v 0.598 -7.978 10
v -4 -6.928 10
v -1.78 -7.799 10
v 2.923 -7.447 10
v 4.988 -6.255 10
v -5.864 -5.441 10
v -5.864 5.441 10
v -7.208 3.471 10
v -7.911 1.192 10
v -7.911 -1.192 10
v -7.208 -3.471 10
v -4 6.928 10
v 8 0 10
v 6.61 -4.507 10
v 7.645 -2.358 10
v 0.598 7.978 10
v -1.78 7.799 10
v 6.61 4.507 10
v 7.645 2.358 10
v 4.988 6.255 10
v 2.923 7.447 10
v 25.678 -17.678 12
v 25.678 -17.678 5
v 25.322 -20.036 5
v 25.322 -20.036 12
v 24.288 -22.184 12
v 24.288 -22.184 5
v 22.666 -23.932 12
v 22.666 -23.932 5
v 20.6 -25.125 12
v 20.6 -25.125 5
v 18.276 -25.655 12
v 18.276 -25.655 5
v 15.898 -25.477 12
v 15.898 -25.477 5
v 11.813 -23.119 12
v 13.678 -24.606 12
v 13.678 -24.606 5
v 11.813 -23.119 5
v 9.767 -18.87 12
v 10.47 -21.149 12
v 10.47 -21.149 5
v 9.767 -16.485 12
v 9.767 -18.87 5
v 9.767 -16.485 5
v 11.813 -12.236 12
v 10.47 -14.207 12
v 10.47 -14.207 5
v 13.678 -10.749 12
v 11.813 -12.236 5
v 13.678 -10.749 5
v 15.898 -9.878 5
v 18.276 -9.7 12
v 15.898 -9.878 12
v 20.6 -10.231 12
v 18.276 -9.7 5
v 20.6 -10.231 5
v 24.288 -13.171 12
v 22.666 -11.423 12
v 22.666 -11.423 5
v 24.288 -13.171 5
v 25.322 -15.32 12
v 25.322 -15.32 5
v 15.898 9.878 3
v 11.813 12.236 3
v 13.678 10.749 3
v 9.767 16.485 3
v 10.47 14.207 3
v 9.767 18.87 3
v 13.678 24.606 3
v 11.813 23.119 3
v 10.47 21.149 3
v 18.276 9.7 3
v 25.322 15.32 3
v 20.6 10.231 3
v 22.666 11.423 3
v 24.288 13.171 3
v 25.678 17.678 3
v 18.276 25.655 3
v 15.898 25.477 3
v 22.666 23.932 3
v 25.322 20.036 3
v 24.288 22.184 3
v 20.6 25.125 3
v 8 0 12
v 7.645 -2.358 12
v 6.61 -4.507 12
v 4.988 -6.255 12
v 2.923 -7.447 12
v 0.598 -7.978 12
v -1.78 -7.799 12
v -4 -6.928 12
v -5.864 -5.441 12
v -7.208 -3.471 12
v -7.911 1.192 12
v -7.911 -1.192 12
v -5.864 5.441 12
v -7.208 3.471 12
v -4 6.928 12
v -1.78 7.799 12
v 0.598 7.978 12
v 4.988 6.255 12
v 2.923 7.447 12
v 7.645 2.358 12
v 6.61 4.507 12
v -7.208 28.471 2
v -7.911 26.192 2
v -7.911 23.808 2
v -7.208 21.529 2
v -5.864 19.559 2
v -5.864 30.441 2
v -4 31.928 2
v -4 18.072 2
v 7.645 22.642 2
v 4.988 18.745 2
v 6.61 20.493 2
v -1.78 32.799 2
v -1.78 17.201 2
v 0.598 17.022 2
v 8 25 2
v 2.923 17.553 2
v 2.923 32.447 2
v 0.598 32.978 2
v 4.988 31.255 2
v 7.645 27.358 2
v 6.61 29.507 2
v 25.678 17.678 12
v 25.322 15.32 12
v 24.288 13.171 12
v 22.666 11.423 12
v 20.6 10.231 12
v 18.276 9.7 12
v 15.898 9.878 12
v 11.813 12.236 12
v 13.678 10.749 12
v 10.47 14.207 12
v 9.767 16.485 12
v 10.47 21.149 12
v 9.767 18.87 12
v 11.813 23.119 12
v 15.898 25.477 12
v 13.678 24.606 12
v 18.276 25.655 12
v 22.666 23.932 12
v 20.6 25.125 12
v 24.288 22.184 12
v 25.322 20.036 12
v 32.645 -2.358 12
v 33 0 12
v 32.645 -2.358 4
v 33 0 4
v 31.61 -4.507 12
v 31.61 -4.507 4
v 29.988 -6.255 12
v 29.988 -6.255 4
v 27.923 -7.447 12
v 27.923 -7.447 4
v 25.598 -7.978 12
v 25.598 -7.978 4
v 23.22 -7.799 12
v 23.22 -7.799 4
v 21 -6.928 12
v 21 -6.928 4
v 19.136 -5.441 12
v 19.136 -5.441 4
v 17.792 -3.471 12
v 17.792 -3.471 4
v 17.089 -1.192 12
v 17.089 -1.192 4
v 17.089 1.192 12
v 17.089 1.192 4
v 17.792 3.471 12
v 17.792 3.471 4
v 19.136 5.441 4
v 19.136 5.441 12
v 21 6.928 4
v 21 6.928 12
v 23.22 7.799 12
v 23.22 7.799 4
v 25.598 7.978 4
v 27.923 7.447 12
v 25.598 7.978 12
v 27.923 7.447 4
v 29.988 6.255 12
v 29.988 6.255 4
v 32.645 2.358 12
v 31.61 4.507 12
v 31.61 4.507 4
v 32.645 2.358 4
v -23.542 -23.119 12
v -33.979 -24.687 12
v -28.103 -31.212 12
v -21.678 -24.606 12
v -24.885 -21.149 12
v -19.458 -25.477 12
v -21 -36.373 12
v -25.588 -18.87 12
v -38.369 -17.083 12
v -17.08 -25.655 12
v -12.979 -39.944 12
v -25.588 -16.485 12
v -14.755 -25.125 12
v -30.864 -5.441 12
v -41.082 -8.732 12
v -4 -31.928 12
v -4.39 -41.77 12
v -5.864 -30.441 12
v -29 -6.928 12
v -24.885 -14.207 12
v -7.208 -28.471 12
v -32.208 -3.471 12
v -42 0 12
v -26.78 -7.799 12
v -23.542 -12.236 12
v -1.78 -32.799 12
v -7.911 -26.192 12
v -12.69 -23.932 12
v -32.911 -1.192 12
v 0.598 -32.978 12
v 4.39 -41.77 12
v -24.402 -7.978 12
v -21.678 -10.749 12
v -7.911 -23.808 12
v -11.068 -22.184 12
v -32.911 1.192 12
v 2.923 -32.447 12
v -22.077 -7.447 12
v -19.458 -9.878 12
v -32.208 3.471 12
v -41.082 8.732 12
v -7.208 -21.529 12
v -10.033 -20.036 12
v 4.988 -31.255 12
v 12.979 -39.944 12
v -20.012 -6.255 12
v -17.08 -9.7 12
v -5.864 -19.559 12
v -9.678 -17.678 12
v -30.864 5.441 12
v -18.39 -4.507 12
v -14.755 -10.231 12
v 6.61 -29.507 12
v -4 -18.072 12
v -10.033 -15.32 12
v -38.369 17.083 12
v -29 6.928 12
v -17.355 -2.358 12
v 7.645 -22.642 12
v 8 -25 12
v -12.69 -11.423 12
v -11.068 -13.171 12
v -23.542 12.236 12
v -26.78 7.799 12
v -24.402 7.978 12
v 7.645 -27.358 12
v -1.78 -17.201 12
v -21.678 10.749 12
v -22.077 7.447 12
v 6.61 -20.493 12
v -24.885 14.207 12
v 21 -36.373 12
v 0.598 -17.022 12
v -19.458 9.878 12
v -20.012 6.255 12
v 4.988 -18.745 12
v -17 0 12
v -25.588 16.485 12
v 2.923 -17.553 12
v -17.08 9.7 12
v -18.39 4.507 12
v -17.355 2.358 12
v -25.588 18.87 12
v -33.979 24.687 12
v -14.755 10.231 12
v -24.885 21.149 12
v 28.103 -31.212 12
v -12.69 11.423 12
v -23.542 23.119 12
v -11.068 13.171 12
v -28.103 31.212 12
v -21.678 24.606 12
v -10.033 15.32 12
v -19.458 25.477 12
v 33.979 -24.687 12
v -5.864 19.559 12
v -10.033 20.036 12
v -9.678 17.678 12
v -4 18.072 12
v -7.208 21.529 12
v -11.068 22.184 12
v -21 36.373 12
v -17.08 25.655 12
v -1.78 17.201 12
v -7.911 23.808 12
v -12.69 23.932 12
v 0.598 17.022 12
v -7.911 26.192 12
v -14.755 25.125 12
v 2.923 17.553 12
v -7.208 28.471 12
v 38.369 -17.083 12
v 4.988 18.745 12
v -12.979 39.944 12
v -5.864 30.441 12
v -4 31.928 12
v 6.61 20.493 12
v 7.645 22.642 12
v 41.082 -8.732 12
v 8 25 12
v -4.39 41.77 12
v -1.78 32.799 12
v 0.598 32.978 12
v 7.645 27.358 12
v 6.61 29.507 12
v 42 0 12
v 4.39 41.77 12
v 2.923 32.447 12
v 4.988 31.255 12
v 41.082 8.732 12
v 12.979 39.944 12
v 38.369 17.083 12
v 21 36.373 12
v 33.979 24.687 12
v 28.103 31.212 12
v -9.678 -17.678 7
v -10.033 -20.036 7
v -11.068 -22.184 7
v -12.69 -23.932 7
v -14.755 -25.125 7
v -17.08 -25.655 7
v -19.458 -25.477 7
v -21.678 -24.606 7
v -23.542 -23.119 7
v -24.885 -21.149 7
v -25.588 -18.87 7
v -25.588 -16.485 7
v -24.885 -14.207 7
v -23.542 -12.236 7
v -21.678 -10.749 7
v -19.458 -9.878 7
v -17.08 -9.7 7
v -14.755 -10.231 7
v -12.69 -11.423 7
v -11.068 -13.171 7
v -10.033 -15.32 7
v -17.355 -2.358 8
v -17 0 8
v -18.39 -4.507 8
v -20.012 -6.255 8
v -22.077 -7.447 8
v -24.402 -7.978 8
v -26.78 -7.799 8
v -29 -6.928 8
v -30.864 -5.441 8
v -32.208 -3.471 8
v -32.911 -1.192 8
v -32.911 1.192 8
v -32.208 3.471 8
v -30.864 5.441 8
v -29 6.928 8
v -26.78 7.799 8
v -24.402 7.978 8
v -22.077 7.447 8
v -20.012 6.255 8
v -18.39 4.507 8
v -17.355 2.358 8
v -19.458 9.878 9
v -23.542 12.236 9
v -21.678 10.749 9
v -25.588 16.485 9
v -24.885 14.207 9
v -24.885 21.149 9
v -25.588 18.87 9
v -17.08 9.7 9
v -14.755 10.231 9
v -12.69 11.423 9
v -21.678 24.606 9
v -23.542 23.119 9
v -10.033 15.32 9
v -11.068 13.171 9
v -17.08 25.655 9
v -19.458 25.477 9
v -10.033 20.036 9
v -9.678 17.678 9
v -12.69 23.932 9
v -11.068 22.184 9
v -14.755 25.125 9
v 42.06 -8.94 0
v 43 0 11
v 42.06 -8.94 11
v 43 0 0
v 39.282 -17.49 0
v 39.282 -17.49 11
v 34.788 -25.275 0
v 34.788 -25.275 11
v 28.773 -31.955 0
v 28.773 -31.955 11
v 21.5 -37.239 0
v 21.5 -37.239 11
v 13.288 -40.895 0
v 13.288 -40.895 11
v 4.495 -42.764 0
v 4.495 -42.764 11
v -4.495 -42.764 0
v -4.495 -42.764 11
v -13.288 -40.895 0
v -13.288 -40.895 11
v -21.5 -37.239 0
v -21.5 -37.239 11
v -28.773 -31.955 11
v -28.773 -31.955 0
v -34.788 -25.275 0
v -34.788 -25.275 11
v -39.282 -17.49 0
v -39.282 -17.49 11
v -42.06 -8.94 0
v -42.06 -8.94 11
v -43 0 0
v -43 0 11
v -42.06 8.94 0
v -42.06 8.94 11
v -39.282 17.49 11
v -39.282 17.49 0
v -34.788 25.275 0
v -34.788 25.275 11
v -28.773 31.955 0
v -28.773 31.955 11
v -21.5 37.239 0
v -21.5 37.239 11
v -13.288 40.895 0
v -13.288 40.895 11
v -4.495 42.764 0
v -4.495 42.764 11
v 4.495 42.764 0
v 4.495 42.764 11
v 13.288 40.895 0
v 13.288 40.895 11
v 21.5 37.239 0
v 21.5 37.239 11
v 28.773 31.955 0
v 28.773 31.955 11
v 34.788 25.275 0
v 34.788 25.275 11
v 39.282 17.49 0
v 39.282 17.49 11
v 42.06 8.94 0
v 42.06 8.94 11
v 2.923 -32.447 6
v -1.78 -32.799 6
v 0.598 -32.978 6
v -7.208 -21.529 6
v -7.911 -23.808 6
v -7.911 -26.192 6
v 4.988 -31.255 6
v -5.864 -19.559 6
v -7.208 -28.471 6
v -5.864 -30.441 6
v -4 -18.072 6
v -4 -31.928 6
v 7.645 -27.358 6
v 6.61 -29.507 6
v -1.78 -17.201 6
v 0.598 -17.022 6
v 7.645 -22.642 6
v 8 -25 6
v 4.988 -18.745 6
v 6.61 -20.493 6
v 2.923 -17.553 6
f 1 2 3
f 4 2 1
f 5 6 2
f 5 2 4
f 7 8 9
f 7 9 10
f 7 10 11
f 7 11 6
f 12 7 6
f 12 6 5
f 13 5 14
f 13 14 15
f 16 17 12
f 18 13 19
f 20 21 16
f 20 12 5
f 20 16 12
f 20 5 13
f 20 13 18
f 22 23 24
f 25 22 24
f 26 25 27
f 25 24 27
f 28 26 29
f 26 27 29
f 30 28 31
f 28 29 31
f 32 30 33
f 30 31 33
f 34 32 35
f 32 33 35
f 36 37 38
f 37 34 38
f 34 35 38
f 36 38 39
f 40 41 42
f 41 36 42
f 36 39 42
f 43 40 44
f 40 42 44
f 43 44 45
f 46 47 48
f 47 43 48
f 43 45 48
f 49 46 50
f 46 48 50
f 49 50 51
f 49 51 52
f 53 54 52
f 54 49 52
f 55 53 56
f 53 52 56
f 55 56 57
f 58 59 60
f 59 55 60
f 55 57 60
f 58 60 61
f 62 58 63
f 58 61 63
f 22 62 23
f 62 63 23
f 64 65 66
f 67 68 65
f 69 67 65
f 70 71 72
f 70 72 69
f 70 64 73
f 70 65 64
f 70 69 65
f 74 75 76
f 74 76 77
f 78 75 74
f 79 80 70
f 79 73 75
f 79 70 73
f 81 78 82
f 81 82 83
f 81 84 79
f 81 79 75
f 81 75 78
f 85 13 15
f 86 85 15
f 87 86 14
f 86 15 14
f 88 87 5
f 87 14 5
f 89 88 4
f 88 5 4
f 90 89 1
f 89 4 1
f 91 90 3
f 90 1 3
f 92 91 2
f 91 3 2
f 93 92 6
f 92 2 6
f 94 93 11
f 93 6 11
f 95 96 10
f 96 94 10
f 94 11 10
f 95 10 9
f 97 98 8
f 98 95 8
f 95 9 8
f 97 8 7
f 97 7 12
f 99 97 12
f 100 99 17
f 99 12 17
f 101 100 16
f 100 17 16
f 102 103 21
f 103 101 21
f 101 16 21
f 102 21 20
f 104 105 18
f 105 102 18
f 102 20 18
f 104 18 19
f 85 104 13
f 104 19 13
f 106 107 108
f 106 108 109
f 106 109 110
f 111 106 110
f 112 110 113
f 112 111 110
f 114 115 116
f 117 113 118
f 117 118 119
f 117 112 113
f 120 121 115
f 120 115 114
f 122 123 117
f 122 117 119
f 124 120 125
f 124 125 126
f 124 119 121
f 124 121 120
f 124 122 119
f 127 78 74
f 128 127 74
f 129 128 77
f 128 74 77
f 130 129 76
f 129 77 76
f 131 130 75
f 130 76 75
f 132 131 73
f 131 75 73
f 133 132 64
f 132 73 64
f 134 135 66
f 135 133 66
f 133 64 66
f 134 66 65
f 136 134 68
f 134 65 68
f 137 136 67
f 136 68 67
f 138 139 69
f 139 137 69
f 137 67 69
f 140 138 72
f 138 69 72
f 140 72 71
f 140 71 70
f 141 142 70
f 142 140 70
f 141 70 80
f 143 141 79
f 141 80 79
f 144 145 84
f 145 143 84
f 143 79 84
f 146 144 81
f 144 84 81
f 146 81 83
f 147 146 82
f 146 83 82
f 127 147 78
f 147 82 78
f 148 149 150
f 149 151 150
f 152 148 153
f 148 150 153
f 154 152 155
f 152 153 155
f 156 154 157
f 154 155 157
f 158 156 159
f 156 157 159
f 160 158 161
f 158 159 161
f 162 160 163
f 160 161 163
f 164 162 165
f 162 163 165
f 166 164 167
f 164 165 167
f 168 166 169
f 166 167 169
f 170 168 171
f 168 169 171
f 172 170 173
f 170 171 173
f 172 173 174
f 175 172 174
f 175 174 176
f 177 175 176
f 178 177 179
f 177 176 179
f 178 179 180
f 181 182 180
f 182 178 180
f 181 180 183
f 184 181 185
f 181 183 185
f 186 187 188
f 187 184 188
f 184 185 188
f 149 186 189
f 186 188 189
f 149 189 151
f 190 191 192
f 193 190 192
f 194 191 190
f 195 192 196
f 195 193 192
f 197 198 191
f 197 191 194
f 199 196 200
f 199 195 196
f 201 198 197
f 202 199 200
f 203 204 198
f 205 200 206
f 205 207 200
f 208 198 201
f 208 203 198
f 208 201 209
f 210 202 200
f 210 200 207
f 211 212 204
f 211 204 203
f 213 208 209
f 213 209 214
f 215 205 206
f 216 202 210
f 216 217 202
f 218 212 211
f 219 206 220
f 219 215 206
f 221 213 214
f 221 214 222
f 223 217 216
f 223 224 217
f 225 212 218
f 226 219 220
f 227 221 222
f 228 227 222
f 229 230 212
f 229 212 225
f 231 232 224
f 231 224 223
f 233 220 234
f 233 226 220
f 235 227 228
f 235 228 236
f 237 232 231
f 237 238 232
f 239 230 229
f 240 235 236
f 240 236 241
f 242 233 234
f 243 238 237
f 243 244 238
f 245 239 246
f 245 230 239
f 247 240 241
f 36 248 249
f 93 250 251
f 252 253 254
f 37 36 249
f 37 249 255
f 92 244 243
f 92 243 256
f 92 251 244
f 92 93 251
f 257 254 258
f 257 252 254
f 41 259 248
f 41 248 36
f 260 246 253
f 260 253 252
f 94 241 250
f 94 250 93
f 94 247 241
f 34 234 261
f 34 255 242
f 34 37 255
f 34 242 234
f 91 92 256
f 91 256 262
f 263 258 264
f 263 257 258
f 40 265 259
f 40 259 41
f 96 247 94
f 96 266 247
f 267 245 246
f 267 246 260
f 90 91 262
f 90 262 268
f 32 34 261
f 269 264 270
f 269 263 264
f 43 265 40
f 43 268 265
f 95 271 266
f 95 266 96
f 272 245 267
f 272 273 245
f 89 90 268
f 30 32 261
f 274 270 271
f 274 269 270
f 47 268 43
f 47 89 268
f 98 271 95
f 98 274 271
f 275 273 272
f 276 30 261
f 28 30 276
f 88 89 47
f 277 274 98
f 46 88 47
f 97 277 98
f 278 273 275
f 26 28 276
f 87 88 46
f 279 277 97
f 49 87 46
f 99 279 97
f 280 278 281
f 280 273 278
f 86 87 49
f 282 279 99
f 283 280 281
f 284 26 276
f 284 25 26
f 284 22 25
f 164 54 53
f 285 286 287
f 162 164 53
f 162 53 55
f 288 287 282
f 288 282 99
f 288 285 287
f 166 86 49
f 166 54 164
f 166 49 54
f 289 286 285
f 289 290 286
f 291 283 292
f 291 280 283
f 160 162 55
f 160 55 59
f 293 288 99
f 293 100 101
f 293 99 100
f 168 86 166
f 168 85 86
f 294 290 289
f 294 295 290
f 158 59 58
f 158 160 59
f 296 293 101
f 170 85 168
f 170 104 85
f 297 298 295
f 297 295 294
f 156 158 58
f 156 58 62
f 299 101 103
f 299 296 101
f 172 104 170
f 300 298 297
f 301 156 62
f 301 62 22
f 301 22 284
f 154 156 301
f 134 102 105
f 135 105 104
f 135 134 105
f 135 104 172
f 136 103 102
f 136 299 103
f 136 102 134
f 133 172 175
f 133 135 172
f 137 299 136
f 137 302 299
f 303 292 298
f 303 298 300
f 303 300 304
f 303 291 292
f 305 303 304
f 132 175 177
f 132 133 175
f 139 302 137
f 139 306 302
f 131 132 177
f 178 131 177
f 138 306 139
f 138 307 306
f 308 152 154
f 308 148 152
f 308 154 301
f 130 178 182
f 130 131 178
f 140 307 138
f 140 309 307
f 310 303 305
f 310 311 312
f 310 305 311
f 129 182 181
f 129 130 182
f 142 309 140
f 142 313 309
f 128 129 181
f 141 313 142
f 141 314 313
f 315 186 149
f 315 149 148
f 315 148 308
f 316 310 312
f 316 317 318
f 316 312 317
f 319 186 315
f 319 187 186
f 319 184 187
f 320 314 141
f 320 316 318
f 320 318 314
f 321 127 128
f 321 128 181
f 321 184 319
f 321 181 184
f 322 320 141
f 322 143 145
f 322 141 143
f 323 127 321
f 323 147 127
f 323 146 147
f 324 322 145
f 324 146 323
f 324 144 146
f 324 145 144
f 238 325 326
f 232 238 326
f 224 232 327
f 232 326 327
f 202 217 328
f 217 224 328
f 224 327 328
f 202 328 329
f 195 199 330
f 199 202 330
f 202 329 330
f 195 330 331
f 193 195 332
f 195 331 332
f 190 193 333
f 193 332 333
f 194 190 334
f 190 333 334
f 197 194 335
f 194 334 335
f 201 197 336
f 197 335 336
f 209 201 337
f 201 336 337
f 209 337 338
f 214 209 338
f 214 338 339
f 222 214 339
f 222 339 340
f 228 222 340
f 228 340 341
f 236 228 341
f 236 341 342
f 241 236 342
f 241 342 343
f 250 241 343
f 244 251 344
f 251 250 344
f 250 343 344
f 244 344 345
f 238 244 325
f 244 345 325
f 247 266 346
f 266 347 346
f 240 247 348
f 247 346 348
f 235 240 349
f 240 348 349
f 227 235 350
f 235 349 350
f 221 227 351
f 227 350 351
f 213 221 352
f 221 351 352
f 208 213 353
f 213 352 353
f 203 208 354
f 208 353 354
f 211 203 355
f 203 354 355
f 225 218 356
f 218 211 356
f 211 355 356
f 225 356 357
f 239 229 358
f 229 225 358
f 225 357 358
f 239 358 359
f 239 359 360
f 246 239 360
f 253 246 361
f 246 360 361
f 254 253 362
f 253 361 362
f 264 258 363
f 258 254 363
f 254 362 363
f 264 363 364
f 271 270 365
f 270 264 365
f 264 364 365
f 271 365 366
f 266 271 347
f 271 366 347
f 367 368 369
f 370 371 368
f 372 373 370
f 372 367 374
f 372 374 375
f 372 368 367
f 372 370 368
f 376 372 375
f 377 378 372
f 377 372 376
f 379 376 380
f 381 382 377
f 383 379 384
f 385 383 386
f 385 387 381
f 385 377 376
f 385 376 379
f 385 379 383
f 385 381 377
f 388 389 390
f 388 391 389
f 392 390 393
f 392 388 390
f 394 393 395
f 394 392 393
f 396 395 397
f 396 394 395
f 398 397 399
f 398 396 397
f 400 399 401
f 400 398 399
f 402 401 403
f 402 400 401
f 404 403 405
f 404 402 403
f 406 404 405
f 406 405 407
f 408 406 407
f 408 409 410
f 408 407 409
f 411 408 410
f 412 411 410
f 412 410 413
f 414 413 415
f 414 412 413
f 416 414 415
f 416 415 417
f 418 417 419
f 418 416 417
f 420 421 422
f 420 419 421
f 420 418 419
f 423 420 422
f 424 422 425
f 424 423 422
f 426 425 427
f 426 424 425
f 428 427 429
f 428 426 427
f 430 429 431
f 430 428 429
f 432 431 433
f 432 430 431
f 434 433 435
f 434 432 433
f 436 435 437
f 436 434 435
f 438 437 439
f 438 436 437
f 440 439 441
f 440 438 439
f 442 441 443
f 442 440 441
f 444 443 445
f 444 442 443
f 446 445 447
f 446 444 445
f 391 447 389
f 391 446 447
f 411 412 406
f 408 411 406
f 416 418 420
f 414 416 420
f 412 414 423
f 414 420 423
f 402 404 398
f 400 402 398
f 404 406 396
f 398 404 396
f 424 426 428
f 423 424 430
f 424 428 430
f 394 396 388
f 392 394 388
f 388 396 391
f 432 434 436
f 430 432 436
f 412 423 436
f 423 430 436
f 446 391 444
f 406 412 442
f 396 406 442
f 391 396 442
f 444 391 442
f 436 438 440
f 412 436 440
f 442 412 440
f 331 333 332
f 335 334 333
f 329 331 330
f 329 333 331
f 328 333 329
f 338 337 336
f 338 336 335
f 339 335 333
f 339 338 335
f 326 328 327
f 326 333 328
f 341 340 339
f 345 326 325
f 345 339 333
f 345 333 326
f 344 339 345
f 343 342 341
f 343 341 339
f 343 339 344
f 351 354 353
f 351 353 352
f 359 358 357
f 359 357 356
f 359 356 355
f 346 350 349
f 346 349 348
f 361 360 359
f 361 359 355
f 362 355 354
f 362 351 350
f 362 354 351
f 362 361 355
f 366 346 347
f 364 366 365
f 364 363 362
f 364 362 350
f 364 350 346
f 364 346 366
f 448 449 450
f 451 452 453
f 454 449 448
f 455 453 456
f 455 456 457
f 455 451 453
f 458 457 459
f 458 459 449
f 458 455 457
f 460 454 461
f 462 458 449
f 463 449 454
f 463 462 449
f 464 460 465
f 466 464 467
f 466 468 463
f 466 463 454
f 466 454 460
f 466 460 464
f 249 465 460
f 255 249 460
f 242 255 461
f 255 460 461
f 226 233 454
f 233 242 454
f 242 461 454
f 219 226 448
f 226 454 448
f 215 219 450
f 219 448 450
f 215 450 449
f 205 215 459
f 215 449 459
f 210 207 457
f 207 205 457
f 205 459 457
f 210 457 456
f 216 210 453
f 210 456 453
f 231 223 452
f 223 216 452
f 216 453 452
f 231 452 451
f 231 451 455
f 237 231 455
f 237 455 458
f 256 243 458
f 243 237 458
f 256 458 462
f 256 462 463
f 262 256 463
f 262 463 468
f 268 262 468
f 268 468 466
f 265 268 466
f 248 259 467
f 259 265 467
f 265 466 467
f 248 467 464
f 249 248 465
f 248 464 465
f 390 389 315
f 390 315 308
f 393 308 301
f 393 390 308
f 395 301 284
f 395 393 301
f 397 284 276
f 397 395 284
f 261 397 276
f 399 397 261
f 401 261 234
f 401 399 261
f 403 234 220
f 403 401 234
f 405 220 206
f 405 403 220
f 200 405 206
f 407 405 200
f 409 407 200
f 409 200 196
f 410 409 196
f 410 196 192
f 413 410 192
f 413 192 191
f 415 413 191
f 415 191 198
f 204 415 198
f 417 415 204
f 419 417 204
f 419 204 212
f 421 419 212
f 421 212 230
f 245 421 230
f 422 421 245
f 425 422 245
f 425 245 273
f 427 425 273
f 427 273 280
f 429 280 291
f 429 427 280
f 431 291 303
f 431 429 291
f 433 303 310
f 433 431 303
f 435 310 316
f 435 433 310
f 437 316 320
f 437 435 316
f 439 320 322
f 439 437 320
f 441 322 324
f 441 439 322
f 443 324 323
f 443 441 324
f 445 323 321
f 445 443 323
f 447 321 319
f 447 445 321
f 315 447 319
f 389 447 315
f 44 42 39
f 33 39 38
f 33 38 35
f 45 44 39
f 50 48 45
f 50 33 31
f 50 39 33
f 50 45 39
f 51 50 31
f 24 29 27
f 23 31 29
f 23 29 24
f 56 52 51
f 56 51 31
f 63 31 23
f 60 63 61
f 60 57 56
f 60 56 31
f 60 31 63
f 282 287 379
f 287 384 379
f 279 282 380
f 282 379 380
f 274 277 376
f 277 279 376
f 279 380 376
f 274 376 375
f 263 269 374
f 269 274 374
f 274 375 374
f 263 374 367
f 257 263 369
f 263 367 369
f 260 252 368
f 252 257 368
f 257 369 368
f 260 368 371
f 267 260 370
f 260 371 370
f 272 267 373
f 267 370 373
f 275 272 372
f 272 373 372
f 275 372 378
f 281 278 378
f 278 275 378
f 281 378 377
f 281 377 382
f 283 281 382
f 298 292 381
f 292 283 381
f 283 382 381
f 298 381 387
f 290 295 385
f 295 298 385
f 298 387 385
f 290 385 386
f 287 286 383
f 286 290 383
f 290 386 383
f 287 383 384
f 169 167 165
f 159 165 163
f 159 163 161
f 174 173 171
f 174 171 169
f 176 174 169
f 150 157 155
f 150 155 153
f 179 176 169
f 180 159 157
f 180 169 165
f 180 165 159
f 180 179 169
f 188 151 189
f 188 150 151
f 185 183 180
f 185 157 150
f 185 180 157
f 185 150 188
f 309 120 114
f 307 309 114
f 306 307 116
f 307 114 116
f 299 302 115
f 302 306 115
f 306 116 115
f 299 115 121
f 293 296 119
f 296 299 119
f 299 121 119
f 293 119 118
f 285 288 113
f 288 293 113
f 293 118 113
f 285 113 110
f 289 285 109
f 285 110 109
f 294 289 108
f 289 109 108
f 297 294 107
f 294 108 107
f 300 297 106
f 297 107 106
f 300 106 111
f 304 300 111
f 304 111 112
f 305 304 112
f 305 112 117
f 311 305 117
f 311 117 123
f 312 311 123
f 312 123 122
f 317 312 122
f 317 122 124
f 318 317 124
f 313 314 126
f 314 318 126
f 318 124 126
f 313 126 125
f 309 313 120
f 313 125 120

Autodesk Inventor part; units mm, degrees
ref_plane "YZ Plane" through (0, 0, 0) normal (1, 0, 0) x (0, 1, 0)
ref_plane "XZ Plane" through (0, 0, 0) normal (0, 1, 0) x (-1, 0, 0)
ref_plane "XY Plane" through (0, 0, 0) normal (0, 0, 1) x (1, 0, 0)
sketch "Sketch1" plane through (0, 0, 0) normal (0, 0, 1) x (1, 0, 0)
  circle A0 centre (0, 0) radius 43
  circle A1 centre (0, 0) radius 8
  circle A2 centre (0, 25) radius 8
  circle A3 centre (-17.6777, 17.6777) radius 8
  circle A4 centre (-25, 0) radius 8
  circle A5 centre (-17.6777, -17.6777) radius 8
  circle A6 centre (0, -25) radius 8
  circle A7 centre (17.6777, -17.6777) radius 8
  circle A8 centre (25, 0) radius 8
  circle A9 centre (17.6777, 17.6777) radius 8
  dimension "diameter" = 16
  dimension "d2" = 16
  dimension "d5" = 360
  dimension "d7" = 25
  dimension "d28" = 86
extrude "Extrusion1" add sketch "Sketch1" along normal blind 12
extrude "Extrusion2" add sketch "Sketch1" along normal blind 2 contours A2
extrude "Extrusion3" add sketch "Sketch1" along normal blind 3 contours A9
extrude "Extrusion4" add sketch "Sketch1" along normal blind 4 contours A8
extrude "Extrusion5" add sketch "Sketch1" along normal blind 5 contours A7
extrude "Extrusion6" add sketch "Sketch1" along normal blind 6 contours A6
extrude "Extrusion7" add sketch "Sketch1" along normal blind 7 contours A5
extrude "Extrusion8" add sketch "Sketch1" along normal blind 8 contours A4
extrude "Extrusion9" add sketch "Sketch1" along normal blind 9 contours A3
extrude "Extrusion10" add sketch "Sketch1" along normal blind 10 contours A1
sketch "Sketch2" plane through (0, 0, 12) normal (0, 0, 1) x (1, 0, 0)
  line L0 (-5.8774, 39.105) -> (5.7366, 39.105) construction
  line L1 (5.7366, 39.105) -> (5.7366, 35.936) construction
  line L2 (5.7366, 35.936) -> (-5.8774, 35.936) construction
  line L3 (-5.8774, 35.936) -> (-5.8774, 39.105) construction
  point P0 (0, 0)
emboss "Emboss1" [suppressed]
chamfer "Chamfer1" distance 1 angle 45 1 edges at (-43, 0, 12)
equation "\"d2\" = diameter"
properties part number "Diameter_16mm"
